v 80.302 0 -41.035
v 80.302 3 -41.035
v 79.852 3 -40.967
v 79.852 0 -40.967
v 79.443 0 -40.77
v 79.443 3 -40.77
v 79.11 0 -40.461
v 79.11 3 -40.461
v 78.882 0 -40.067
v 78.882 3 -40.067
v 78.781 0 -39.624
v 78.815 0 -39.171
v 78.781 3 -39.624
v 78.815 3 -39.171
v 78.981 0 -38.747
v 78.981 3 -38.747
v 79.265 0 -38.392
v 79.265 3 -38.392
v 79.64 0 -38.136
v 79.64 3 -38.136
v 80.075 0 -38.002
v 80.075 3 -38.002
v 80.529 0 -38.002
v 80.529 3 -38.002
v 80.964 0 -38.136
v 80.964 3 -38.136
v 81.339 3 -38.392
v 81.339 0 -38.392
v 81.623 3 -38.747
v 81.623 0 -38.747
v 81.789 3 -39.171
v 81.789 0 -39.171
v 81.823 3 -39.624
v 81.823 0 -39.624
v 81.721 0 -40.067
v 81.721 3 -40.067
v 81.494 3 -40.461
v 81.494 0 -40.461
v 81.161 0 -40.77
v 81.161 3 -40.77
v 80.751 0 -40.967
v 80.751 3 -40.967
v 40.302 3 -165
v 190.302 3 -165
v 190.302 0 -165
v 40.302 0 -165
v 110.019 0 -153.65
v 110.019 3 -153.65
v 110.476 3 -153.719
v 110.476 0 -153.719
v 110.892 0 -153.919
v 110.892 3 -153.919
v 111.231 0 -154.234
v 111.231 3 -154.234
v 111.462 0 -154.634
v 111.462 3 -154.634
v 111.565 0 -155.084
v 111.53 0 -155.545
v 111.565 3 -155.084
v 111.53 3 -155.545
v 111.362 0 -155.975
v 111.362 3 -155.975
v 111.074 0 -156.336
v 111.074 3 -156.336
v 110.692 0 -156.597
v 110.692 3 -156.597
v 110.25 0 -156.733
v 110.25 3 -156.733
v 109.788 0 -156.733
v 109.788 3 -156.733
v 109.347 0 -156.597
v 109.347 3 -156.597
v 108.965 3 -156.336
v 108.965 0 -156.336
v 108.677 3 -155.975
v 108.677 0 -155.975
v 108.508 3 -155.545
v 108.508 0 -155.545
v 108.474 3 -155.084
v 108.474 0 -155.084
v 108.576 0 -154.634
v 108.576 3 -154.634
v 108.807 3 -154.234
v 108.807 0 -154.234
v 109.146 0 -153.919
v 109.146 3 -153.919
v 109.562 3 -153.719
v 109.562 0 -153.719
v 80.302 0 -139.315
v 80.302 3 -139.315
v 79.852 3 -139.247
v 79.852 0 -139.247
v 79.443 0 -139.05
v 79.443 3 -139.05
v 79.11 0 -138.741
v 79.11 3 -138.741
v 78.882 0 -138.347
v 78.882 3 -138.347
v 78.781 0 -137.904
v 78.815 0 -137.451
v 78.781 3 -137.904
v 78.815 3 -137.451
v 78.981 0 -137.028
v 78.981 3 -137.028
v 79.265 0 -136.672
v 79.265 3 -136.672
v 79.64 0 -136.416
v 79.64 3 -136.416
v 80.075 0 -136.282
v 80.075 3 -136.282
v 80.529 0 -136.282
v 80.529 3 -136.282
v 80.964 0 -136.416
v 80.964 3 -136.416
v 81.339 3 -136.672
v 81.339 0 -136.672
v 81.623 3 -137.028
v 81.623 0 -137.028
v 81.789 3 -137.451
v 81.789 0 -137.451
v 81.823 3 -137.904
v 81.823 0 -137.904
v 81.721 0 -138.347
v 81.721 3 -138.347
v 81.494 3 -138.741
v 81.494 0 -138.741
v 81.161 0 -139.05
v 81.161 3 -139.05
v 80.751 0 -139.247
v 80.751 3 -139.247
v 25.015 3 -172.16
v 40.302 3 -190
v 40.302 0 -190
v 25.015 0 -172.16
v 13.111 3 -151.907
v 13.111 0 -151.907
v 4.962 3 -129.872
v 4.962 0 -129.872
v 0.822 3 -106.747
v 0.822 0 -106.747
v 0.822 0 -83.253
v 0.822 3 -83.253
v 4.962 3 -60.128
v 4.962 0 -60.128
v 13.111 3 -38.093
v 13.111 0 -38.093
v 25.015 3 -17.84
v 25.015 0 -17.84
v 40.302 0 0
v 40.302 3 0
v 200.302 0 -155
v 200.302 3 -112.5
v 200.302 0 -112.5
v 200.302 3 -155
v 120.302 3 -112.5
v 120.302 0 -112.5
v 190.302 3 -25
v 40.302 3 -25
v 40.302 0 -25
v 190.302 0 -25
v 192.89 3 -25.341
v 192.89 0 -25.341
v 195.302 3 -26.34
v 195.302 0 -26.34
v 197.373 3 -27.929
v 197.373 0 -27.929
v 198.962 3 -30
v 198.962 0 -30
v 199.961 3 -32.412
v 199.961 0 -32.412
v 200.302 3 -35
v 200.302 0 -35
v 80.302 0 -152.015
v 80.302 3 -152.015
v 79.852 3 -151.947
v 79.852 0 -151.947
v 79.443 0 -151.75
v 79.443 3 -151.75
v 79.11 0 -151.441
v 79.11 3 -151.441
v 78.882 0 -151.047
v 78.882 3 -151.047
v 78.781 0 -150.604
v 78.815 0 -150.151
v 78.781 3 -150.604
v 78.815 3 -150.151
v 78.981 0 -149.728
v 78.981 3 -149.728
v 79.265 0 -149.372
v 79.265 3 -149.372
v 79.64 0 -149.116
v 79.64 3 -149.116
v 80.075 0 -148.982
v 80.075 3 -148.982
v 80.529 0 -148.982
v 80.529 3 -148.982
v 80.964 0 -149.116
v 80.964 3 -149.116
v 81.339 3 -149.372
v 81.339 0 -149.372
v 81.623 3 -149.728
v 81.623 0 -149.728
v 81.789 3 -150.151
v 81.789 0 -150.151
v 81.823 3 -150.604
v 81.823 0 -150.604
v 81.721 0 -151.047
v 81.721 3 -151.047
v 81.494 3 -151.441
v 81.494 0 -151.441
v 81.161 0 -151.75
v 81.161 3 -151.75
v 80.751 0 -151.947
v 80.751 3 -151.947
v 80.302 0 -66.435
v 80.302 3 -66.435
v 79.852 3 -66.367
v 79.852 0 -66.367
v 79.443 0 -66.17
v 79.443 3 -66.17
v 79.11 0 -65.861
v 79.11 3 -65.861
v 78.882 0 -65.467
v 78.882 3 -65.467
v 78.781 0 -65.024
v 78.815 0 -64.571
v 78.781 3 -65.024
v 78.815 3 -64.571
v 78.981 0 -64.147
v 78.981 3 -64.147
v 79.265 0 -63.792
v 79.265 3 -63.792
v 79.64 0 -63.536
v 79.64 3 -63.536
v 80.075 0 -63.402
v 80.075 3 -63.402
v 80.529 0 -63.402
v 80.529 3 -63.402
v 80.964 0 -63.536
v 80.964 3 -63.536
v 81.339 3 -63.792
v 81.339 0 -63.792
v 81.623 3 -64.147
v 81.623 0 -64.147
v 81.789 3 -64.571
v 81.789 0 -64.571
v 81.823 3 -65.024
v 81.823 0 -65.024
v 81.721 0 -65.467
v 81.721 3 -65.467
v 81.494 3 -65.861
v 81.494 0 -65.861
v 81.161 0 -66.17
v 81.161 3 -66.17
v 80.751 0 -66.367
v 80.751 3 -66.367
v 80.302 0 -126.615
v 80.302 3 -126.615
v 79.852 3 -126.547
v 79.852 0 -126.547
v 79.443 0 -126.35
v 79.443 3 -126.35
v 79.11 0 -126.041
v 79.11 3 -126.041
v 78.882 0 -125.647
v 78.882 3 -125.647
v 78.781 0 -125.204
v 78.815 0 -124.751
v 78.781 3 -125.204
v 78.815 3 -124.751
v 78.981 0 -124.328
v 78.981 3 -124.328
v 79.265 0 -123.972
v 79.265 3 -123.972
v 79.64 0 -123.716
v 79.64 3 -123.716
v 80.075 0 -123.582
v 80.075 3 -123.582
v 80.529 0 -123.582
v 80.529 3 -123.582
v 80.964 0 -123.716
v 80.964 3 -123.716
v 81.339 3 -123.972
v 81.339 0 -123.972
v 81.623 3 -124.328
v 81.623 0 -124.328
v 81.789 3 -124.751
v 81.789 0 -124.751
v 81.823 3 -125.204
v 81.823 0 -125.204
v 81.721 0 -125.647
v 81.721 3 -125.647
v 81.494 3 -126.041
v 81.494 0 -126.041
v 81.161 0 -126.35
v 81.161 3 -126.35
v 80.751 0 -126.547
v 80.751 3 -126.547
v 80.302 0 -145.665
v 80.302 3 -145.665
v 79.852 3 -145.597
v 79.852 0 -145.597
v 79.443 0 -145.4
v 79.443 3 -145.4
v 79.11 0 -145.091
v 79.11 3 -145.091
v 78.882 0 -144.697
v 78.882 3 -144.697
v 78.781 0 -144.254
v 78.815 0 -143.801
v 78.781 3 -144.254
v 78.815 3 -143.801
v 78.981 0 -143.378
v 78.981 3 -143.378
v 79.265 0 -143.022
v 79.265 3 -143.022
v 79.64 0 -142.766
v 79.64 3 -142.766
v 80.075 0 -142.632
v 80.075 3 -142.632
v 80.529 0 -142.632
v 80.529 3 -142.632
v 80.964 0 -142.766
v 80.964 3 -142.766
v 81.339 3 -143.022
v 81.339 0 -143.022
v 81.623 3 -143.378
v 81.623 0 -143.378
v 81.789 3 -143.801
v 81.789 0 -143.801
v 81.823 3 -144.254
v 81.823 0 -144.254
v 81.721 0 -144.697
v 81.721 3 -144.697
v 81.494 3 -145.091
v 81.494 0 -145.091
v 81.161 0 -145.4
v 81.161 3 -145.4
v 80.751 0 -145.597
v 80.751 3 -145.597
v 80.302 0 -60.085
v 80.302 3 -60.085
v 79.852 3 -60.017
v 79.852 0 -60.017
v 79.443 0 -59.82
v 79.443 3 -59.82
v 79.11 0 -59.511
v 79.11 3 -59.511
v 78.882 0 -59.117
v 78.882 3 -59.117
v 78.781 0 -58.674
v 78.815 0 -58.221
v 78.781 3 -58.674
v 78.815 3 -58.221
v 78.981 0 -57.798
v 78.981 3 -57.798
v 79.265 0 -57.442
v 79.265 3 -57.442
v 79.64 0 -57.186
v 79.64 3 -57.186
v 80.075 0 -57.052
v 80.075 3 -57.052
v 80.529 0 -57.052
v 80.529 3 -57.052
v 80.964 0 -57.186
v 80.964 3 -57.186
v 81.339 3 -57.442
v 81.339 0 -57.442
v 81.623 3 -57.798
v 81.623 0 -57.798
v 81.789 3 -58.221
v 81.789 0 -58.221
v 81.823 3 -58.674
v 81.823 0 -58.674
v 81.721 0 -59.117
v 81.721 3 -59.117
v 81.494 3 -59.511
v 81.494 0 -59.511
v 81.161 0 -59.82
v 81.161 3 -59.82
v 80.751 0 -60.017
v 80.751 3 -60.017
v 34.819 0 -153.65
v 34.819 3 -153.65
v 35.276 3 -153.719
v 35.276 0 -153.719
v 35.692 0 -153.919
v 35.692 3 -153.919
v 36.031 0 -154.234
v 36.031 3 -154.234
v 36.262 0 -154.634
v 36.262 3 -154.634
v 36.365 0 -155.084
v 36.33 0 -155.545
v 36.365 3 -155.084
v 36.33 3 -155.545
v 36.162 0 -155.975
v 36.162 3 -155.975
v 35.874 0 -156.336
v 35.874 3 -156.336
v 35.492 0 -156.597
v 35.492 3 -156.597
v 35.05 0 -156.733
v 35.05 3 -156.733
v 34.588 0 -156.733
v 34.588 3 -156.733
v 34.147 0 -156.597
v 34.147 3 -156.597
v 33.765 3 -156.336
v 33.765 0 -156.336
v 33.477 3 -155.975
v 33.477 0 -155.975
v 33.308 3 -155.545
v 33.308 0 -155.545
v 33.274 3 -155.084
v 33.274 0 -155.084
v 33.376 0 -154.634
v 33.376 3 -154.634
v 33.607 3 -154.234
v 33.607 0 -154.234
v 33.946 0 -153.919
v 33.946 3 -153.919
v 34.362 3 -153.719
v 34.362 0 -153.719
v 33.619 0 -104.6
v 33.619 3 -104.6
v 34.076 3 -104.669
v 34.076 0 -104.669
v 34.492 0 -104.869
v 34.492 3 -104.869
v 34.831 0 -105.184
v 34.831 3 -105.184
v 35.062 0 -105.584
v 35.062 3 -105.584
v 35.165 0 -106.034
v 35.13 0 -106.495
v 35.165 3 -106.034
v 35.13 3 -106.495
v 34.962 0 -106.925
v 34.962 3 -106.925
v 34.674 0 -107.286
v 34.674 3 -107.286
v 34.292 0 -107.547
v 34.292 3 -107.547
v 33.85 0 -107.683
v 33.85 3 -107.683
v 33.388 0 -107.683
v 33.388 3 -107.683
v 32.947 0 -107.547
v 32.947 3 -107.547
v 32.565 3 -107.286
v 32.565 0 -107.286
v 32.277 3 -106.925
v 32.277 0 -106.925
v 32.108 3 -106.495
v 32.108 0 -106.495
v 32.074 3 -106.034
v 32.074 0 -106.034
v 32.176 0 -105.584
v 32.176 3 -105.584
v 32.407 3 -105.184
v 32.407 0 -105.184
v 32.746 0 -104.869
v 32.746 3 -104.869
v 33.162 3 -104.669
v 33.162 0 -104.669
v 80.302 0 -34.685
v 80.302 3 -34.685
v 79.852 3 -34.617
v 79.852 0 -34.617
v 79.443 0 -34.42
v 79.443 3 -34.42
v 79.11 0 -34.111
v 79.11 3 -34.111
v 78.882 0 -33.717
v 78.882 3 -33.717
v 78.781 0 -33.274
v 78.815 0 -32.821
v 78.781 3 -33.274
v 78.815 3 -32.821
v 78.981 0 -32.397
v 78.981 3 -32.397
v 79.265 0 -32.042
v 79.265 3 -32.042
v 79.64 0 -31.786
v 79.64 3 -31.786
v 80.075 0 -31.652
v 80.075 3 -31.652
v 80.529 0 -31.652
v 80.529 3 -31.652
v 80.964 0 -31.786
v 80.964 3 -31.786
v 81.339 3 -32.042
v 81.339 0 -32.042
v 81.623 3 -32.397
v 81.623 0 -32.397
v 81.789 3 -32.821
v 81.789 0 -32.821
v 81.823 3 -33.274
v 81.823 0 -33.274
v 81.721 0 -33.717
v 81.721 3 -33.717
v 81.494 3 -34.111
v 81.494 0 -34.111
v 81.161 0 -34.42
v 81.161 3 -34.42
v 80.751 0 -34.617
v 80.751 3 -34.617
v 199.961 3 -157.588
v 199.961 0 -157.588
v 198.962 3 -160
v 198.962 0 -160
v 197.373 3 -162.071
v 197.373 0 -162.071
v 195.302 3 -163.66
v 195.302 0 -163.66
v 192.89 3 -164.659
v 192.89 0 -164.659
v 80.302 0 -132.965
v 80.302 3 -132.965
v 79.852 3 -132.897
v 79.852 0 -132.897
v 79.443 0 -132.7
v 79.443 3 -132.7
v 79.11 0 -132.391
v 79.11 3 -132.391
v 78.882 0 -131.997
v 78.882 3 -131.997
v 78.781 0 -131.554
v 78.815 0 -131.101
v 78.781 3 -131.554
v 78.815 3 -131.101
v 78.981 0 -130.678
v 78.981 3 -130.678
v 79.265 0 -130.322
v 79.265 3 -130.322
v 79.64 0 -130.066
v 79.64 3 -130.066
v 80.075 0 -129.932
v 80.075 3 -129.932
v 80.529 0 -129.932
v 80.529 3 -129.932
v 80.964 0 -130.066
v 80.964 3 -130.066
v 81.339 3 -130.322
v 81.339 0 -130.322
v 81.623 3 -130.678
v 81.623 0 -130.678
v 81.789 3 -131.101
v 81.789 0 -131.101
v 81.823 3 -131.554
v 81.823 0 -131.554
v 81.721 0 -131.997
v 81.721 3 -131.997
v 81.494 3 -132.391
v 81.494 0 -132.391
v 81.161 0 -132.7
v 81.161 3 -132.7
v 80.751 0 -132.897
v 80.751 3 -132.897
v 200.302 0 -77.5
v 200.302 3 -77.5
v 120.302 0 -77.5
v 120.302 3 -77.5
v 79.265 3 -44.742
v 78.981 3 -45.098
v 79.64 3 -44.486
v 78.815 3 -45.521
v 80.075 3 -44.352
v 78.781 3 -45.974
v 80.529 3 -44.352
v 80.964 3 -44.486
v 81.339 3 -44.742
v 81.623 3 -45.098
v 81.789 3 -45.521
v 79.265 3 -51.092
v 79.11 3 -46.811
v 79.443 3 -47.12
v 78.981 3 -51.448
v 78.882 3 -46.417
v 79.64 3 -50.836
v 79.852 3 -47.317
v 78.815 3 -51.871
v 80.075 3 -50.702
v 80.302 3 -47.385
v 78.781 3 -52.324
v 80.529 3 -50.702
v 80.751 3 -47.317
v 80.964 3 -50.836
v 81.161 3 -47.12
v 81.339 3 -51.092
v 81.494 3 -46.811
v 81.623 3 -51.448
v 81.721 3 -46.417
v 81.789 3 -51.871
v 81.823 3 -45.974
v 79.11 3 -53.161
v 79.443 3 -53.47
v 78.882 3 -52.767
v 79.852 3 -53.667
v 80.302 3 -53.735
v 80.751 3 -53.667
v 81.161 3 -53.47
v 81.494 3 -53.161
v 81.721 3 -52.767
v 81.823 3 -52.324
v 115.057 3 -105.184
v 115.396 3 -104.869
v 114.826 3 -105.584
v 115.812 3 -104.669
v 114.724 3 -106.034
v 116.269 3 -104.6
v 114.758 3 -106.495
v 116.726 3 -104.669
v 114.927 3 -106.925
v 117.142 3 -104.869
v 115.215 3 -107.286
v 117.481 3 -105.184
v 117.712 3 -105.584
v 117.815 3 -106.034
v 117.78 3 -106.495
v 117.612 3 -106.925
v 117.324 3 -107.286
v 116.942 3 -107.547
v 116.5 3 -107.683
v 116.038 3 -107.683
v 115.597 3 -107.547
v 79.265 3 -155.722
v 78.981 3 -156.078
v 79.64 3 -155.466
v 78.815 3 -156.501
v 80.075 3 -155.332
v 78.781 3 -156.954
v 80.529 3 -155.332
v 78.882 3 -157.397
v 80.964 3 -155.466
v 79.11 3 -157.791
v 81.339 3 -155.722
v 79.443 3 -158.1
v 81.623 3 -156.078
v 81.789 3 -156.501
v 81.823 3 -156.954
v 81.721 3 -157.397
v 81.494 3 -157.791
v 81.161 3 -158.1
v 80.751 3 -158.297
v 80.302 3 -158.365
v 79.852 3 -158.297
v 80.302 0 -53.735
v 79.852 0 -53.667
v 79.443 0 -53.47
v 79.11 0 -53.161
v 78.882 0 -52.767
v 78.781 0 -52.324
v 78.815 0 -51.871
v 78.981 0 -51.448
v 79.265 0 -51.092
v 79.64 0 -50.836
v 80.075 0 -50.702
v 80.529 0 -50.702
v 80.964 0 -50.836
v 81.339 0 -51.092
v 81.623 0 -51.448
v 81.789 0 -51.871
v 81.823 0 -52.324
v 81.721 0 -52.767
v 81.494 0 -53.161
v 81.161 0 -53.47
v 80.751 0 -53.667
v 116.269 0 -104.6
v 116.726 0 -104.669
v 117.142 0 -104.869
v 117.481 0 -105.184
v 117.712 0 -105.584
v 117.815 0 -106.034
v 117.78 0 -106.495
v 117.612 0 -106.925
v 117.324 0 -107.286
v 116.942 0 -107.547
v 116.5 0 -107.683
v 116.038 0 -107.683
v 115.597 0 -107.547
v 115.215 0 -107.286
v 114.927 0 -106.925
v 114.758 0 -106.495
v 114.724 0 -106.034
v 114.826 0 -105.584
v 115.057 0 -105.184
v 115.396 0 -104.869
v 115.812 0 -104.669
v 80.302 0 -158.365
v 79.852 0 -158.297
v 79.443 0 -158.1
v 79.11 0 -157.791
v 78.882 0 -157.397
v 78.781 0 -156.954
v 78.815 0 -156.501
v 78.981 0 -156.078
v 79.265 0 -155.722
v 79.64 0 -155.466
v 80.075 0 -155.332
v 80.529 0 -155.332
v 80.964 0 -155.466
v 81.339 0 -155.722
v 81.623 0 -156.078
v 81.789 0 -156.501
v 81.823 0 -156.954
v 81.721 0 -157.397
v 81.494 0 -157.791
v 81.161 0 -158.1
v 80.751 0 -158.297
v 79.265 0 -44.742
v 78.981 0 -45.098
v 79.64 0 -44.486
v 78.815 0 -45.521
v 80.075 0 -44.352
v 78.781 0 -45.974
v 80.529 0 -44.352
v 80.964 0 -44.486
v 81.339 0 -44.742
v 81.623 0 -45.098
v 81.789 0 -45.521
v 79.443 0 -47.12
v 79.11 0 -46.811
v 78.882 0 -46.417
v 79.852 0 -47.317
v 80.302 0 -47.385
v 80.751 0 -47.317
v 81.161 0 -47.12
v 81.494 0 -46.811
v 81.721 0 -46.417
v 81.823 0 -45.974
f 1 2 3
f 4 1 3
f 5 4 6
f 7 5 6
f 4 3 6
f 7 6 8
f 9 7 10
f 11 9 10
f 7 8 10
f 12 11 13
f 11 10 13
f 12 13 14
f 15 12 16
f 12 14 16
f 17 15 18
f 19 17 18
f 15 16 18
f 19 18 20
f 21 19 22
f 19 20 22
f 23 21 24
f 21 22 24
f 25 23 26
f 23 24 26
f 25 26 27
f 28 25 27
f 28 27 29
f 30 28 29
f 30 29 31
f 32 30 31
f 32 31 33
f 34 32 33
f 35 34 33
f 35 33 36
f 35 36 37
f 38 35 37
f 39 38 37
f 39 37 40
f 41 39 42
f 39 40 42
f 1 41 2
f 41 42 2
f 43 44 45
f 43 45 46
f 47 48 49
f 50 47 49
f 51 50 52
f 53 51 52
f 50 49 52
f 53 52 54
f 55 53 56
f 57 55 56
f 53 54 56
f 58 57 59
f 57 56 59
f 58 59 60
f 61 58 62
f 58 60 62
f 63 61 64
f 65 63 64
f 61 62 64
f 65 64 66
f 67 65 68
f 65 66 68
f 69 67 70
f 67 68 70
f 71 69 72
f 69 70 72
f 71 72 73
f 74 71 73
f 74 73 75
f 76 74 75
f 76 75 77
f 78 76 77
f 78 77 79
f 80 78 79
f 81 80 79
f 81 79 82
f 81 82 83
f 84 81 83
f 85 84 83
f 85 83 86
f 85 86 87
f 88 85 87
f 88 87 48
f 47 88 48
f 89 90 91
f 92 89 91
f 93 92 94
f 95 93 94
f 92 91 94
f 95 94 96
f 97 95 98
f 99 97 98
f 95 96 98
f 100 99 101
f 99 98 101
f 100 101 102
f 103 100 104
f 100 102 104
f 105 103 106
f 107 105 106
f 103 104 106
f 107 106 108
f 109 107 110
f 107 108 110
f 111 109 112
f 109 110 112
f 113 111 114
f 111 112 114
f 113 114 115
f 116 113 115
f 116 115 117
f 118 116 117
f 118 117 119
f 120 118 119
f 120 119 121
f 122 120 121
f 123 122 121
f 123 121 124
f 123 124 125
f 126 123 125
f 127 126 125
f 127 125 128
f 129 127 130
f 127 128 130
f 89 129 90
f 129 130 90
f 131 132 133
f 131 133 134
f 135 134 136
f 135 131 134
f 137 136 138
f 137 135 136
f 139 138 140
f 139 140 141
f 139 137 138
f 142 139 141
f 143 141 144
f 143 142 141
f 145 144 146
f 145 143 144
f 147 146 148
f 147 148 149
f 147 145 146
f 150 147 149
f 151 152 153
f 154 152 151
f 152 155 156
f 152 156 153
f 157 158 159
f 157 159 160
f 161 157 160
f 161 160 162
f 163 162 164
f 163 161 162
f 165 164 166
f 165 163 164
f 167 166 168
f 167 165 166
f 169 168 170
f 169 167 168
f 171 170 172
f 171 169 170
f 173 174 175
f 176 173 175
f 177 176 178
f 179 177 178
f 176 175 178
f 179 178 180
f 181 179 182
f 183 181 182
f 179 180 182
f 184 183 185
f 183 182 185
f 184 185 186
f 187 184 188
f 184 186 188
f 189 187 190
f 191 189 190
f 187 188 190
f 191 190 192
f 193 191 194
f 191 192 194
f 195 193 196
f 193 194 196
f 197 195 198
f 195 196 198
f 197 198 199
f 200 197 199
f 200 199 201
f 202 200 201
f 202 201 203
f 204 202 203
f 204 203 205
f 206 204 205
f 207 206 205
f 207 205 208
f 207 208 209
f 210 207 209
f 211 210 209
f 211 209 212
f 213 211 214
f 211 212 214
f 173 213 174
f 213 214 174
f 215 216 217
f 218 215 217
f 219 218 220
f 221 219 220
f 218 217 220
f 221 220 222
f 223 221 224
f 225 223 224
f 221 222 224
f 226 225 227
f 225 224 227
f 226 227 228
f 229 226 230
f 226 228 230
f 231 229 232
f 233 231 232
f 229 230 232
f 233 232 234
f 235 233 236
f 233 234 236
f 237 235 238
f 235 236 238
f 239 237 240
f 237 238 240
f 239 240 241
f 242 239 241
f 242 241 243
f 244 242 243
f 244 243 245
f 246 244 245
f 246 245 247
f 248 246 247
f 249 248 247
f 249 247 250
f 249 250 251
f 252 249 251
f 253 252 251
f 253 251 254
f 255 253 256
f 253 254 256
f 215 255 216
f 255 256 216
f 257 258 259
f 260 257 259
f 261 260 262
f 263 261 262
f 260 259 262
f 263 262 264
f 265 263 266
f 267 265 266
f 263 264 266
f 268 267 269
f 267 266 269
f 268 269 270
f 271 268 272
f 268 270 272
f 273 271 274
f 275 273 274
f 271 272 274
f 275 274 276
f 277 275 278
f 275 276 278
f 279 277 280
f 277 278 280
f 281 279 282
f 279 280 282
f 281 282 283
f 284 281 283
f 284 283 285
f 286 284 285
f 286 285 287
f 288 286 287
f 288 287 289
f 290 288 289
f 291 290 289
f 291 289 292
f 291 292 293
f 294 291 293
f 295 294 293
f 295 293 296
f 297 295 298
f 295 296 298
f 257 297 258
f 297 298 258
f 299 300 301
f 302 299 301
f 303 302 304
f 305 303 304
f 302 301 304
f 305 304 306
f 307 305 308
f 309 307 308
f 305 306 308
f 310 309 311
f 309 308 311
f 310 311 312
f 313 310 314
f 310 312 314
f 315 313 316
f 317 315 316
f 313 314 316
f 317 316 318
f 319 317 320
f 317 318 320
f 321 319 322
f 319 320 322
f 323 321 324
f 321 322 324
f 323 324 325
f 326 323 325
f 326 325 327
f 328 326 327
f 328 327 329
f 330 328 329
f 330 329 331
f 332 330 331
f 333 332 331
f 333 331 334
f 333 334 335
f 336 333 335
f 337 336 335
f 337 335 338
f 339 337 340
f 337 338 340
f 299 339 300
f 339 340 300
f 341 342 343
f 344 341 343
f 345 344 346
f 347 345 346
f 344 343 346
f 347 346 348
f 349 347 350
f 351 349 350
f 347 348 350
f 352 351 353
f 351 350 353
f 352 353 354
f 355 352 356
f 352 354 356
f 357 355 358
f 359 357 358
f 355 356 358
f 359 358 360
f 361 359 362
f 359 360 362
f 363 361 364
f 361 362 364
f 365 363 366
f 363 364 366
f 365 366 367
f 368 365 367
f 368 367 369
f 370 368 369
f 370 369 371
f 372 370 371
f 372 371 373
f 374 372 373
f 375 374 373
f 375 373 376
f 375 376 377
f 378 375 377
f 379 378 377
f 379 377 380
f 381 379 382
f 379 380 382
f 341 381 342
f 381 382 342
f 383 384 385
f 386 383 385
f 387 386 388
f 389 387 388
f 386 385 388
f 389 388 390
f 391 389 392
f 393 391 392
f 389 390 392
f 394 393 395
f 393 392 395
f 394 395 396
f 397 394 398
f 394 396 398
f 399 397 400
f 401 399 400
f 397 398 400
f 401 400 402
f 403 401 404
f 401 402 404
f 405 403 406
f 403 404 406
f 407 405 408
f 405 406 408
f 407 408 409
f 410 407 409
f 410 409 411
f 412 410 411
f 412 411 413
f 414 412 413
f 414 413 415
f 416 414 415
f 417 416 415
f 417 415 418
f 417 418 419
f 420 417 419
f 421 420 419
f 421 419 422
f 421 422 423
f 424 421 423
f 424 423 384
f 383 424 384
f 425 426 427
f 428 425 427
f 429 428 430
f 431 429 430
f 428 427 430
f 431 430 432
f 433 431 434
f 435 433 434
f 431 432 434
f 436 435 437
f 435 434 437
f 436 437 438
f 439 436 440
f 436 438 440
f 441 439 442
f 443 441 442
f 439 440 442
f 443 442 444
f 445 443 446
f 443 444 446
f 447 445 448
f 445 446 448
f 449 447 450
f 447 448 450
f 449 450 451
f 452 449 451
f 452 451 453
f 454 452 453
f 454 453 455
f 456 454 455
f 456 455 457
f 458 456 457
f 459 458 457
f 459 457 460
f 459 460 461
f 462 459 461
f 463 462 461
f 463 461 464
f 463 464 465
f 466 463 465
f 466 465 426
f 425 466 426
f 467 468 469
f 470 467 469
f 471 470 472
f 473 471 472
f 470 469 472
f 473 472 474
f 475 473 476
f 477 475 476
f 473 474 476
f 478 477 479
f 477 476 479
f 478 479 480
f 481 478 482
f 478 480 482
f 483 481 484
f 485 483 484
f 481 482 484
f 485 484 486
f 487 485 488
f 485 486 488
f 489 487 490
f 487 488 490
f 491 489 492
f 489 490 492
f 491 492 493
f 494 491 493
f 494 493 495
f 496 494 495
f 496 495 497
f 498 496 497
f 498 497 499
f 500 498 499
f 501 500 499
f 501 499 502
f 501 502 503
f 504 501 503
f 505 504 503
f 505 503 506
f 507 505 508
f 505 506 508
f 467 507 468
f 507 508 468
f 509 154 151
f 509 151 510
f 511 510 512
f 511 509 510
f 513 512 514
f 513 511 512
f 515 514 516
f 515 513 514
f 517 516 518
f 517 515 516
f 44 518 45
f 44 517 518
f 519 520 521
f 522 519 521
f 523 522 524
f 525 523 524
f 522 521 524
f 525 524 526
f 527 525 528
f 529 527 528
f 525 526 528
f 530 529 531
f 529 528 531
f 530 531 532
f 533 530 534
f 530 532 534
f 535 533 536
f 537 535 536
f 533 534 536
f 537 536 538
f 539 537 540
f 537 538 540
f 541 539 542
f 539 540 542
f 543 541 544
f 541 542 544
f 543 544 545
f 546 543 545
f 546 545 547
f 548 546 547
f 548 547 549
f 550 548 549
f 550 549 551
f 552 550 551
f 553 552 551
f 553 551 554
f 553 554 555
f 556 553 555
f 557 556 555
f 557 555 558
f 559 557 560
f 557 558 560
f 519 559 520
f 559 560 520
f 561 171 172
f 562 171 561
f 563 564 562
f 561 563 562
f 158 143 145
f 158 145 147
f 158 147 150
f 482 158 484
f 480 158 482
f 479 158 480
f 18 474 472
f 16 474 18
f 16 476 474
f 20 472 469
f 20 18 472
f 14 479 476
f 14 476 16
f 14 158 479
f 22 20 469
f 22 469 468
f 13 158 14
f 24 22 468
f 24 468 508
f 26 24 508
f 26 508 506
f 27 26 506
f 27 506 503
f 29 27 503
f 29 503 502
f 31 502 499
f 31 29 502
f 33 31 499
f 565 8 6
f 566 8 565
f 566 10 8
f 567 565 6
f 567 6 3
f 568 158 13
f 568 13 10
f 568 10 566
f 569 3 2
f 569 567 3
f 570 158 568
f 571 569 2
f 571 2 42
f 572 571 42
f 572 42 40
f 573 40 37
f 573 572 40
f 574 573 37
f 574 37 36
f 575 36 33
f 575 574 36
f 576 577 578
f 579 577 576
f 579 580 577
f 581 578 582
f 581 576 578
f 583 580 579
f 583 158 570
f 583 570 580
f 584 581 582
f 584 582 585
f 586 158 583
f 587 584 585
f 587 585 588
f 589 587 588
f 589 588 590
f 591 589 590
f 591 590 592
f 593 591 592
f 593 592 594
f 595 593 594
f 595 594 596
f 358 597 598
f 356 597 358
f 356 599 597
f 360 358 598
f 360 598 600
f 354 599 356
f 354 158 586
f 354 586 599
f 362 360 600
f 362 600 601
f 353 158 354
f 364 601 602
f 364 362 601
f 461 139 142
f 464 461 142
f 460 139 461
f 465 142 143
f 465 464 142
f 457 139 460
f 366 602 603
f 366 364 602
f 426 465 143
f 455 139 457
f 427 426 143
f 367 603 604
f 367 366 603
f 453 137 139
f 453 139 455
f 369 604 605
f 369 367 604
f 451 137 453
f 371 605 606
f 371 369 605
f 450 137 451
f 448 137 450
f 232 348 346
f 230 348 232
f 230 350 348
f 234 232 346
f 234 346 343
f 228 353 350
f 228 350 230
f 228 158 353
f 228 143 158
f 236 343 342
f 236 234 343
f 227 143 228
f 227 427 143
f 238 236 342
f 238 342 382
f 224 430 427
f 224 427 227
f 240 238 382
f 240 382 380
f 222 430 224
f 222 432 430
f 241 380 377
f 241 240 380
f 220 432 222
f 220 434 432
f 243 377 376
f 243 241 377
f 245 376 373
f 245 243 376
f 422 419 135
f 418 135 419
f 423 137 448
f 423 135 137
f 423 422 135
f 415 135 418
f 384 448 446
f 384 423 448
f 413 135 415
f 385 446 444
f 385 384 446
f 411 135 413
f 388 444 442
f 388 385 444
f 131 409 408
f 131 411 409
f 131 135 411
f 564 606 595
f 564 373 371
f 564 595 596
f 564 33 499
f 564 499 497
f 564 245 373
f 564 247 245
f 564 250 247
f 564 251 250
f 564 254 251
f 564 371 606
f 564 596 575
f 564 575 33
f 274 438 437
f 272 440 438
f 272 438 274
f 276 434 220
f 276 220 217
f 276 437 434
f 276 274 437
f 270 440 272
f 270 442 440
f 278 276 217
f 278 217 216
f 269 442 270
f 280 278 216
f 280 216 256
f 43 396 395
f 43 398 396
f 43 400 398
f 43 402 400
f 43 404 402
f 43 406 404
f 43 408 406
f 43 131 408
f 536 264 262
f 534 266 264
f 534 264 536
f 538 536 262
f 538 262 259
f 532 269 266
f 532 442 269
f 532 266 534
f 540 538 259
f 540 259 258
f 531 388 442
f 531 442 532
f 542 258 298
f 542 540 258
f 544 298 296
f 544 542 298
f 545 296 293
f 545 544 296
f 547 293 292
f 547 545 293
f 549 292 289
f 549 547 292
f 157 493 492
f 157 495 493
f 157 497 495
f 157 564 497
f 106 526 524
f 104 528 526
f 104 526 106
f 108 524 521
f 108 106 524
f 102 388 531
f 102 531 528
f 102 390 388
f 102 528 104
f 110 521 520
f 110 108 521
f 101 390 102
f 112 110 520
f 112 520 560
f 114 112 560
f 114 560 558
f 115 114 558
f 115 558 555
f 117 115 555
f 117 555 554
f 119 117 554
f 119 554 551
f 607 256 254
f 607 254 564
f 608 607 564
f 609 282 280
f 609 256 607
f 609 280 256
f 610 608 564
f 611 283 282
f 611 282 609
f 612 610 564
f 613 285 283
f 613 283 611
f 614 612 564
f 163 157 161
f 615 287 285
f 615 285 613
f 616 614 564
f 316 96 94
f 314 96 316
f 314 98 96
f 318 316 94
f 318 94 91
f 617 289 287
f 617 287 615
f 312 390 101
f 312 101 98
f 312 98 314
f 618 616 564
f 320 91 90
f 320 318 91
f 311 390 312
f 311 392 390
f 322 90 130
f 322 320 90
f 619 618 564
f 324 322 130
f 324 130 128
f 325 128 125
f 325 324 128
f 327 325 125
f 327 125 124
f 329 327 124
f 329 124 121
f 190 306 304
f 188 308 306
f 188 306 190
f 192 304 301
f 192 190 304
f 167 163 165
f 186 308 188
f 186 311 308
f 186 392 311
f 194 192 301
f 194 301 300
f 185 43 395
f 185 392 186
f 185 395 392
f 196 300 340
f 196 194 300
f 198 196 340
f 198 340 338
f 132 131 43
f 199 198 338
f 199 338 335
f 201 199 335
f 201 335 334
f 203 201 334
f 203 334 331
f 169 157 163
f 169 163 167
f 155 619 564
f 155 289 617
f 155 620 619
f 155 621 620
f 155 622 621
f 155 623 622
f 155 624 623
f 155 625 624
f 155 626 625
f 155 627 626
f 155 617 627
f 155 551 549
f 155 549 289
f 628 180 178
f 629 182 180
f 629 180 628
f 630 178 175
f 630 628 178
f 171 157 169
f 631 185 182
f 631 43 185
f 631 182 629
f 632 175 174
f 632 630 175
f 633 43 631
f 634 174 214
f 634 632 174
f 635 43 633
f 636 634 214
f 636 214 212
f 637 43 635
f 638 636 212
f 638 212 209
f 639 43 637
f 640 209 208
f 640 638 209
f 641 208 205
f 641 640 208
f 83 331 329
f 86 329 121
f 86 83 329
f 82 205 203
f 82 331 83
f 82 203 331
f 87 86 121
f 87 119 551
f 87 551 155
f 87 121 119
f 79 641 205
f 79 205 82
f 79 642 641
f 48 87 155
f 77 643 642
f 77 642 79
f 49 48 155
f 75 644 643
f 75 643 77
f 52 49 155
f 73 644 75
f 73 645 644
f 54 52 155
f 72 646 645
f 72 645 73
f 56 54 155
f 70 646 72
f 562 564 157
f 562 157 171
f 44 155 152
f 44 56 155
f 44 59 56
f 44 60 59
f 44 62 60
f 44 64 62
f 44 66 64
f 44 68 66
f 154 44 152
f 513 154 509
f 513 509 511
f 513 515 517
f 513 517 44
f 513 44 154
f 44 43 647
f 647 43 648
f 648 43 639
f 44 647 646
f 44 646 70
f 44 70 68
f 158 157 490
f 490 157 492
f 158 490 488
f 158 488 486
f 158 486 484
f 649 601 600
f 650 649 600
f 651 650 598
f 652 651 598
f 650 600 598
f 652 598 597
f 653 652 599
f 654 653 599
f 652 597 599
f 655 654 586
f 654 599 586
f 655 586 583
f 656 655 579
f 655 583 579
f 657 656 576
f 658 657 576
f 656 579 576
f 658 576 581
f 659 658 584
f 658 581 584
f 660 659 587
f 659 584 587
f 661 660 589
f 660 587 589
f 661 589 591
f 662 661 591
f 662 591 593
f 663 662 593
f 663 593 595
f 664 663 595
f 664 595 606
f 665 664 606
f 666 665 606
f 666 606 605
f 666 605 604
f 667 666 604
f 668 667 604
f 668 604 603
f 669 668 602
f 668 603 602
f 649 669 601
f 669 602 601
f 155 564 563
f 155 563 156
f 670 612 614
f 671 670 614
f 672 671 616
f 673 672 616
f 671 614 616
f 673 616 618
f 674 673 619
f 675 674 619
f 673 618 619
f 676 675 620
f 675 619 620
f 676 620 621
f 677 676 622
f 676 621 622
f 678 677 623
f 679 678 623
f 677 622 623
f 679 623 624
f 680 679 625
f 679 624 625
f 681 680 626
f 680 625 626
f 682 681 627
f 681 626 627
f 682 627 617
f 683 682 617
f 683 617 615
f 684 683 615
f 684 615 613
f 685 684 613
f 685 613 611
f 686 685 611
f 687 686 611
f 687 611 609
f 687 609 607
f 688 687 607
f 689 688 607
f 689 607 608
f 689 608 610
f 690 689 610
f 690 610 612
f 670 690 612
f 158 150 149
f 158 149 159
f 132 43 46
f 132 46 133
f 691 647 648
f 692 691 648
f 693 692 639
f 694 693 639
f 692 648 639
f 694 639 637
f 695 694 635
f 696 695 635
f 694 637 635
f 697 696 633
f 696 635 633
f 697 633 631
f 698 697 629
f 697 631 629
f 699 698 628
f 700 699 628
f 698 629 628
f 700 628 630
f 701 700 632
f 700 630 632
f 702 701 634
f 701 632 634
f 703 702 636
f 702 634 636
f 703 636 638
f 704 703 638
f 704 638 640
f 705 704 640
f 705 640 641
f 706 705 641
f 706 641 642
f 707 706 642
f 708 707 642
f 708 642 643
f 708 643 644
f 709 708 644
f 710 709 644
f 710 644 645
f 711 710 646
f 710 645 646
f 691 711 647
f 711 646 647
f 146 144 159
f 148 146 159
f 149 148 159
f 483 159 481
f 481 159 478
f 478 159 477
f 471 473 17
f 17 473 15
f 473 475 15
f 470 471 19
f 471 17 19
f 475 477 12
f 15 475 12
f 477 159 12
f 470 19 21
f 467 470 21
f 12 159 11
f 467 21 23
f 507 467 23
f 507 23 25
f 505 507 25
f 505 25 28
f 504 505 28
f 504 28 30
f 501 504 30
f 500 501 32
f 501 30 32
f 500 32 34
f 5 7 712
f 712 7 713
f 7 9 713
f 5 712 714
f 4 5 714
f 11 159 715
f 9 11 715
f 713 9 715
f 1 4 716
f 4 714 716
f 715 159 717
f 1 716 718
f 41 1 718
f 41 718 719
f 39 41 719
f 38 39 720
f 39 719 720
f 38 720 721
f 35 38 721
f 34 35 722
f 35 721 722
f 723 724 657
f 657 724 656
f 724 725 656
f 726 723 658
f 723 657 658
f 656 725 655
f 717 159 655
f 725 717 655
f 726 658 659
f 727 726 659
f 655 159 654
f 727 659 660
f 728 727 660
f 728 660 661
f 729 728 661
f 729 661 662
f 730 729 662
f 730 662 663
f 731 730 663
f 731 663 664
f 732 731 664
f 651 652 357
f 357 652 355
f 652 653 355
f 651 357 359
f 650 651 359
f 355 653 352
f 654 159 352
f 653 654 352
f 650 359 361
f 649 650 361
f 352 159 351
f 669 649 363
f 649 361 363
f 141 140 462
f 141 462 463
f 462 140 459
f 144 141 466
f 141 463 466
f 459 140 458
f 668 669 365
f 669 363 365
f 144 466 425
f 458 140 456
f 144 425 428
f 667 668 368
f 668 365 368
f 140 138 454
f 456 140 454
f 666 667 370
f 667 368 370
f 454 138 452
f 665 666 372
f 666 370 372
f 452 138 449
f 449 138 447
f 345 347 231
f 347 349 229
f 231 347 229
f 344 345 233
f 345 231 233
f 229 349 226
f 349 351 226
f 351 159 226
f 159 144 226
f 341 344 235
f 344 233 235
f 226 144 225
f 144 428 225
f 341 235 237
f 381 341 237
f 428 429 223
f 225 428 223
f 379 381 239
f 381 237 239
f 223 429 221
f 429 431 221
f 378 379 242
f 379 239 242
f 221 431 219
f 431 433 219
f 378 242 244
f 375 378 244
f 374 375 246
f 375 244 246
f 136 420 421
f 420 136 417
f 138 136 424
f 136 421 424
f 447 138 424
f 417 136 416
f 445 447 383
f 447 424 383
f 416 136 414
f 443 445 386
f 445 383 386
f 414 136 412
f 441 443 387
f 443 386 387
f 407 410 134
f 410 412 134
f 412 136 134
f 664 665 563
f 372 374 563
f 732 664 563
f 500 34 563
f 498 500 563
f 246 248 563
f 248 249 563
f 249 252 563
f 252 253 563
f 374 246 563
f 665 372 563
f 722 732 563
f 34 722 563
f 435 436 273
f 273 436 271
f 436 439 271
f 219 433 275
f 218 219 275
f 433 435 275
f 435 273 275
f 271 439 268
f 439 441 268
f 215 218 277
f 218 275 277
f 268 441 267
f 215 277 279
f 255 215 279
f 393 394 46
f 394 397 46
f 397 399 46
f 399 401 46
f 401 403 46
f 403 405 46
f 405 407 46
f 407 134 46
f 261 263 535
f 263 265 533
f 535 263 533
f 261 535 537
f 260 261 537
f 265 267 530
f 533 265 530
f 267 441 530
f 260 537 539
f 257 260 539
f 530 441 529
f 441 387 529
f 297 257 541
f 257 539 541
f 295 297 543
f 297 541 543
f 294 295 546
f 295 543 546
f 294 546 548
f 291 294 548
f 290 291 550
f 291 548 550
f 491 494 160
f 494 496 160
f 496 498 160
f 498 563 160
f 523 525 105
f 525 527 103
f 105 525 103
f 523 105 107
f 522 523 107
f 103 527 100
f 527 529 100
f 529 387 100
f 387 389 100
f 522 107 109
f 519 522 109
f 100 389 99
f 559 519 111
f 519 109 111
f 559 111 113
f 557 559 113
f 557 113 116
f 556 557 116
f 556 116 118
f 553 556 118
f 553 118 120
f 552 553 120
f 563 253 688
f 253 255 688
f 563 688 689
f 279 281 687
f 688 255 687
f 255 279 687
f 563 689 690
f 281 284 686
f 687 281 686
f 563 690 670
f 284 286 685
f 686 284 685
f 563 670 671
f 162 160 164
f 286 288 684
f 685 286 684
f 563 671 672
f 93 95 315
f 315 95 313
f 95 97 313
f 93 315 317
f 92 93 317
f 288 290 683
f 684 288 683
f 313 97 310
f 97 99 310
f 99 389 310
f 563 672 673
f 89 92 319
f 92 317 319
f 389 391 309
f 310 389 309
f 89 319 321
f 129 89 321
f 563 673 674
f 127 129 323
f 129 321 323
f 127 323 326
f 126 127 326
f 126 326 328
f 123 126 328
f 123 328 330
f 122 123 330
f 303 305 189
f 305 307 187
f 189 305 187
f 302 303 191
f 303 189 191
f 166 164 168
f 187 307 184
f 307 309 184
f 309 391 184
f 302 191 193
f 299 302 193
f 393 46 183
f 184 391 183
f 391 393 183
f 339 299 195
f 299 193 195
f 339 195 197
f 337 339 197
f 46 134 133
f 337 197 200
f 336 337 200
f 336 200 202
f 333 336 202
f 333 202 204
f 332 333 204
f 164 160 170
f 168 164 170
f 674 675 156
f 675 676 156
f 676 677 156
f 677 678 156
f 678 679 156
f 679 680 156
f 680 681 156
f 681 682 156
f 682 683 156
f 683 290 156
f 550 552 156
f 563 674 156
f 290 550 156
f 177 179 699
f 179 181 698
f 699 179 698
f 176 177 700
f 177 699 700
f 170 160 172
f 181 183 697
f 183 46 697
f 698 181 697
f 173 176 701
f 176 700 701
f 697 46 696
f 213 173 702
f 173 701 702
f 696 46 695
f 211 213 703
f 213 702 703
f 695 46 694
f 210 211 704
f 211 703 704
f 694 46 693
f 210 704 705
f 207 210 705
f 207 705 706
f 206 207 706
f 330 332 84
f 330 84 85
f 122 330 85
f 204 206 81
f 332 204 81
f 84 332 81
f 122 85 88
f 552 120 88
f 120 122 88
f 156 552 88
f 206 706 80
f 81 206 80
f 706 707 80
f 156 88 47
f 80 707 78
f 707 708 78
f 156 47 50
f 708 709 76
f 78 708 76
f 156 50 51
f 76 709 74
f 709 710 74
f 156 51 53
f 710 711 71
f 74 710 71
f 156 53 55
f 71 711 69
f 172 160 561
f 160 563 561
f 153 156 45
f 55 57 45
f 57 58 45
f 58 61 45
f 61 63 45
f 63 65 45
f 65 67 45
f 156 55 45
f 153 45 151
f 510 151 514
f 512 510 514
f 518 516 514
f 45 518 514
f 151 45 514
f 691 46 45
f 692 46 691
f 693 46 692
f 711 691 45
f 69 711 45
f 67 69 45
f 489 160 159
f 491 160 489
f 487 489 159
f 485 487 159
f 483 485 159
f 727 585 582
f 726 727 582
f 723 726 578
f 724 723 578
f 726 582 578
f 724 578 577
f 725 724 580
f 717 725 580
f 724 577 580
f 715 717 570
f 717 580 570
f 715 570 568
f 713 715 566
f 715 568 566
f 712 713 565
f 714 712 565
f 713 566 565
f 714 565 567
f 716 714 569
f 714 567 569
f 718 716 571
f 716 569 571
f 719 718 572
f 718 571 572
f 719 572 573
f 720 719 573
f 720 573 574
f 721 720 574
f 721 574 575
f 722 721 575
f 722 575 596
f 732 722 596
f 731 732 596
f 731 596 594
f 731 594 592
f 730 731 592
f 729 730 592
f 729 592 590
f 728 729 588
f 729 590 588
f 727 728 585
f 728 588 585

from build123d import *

# Parameters (mm, degrees)
SKETCH1_R           = 1.525
BOSS_EXTRUDE1_DEPTH = 3
SKETCH2_W           = 80
SKETCH2_H           = 35
CUT_EXTRUDE1_DEPTH  = 5
SKETCH4_R           = 1.55
CUT_EXTRUDE2_DEPTH  = 277.097497981


with BuildPart() as part:
    # Sketch1 → Boss-Extrude1 (new body)
    with BuildSketch(Plane(origin=(0, 3, 0), x_dir=(1, 0, 0), z_dir=(0, 1, 0))):
        with BuildLine():
            Line((200.301843205, 35), (200.301843205, 155))
            ThreePointArc((200.301843205, 155), (197.372911017, 162.071067812), (190.301843205, 165))
            Line((190.301843205, 165), (40.301843205, 165))
            Line((40.301843205, 165), (40.301843205, 190))
            ThreePointArc((40.301843205, 190), (0.301843205, 95), (40.301843205, 0))
            Line((40.301843205, 0), (40.301843205, 25))
            Line((40.301843205, 25), (190.301843205, 25))
            ThreePointArc((190.301843205, 25), (197.372911017, 27.928932188), (200.301843205, 35))
        make_face()
        with Locations(Location((80.301843205, 33.16, 0), (0, 0, 90))):
            Circle(SKETCH1_R, mode=Mode.SUBTRACT)
        with Locations(Location((80.301843205, 125.09, 0), (0, 0, 90))):
            Circle(SKETCH1_R, mode=Mode.SUBTRACT)
        with Locations(Location((80.301843205, 131.44, 0), (0, 0, 90))):
            Circle(SKETCH1_R, mode=Mode.SUBTRACT)
        with Locations(Location((80.301843205, 137.79, 0), (0, 0, 90))):
            Circle(SKETCH1_R, mode=Mode.SUBTRACT)
        with Locations(Location((80.301843205, 64.91, 0), (0, 0, 90))):
            Circle(SKETCH1_R, mode=Mode.SUBTRACT)
        with Locations(Location((80.301843205, 156.84, 0), (0, 0, 90))):
            Circle(SKETCH1_R, mode=Mode.SUBTRACT)
        with Locations(Location((80.301843205, 150.49, 0), (0, 0, 90))):
            Circle(SKETCH1_R, mode=Mode.SUBTRACT)
        with Locations(Location((80.301843205, 144.14, 0), (0, 0, 90))):
            Circle(SKETCH1_R, mode=Mode.SUBTRACT)
        with Locations(Location((80.301843205, 58.56, 0), (0, 0, 90))):
            Circle(SKETCH1_R, mode=Mode.SUBTRACT)
        with Locations(Location((80.301843205, 52.21, 0), (0, 0, 90))):
            Circle(SKETCH1_R, mode=Mode.SUBTRACT)
        with Locations(Location((80.301843205, 45.86, 0), (0, 0, 90))):
            Circle(SKETCH1_R, mode=Mode.SUBTRACT)
        with Locations(Location((80.301843205, 39.51, 0), (0, 0, 90))):
            Circle(SKETCH1_R, mode=Mode.SUBTRACT)
    extrude(amount=-BOSS_EXTRUDE1_DEPTH)

    # Sketch2 → Cut-Extrude1 (cut)
    with BuildSketch(Plane(origin=(0, 3, 0), x_dir=(1, 0, 0), z_dir=(0, 1, 0))):
        with Locations((160.301843205, 95)):
            Rectangle(SKETCH2_W, SKETCH2_H)
    extrude(amount=-CUT_EXTRUDE1_DEPTH, mode=Mode.SUBTRACT)

    # Sketch4 → Cut-Extrude2 (cut, through all)
    with BuildSketch(Plane(origin=(0, 3, 0), x_dir=(1, 0, 0), z_dir=(0, 1, 0))):
        with Locations(Location((34.819271837, 155.2, 0), (0, 0, 270))):
            Circle(SKETCH4_R)
        with Locations(Location((33.619271837, 106.15, 0), (0, 0, 270))):
            Circle(SKETCH4_R)
        with Locations(Location((110.019271837, 155.2, 0), (0, 0, 270))):
            Circle(SKETCH4_R)
        with Locations(Location((116.269271837, 106.15, 0), (0, 0, 270))):
            Circle(SKETCH4_R)
    extrude(amount=-CUT_EXTRUDE2_DEPTH, mode=Mode.SUBTRACT)


solid = part.part
